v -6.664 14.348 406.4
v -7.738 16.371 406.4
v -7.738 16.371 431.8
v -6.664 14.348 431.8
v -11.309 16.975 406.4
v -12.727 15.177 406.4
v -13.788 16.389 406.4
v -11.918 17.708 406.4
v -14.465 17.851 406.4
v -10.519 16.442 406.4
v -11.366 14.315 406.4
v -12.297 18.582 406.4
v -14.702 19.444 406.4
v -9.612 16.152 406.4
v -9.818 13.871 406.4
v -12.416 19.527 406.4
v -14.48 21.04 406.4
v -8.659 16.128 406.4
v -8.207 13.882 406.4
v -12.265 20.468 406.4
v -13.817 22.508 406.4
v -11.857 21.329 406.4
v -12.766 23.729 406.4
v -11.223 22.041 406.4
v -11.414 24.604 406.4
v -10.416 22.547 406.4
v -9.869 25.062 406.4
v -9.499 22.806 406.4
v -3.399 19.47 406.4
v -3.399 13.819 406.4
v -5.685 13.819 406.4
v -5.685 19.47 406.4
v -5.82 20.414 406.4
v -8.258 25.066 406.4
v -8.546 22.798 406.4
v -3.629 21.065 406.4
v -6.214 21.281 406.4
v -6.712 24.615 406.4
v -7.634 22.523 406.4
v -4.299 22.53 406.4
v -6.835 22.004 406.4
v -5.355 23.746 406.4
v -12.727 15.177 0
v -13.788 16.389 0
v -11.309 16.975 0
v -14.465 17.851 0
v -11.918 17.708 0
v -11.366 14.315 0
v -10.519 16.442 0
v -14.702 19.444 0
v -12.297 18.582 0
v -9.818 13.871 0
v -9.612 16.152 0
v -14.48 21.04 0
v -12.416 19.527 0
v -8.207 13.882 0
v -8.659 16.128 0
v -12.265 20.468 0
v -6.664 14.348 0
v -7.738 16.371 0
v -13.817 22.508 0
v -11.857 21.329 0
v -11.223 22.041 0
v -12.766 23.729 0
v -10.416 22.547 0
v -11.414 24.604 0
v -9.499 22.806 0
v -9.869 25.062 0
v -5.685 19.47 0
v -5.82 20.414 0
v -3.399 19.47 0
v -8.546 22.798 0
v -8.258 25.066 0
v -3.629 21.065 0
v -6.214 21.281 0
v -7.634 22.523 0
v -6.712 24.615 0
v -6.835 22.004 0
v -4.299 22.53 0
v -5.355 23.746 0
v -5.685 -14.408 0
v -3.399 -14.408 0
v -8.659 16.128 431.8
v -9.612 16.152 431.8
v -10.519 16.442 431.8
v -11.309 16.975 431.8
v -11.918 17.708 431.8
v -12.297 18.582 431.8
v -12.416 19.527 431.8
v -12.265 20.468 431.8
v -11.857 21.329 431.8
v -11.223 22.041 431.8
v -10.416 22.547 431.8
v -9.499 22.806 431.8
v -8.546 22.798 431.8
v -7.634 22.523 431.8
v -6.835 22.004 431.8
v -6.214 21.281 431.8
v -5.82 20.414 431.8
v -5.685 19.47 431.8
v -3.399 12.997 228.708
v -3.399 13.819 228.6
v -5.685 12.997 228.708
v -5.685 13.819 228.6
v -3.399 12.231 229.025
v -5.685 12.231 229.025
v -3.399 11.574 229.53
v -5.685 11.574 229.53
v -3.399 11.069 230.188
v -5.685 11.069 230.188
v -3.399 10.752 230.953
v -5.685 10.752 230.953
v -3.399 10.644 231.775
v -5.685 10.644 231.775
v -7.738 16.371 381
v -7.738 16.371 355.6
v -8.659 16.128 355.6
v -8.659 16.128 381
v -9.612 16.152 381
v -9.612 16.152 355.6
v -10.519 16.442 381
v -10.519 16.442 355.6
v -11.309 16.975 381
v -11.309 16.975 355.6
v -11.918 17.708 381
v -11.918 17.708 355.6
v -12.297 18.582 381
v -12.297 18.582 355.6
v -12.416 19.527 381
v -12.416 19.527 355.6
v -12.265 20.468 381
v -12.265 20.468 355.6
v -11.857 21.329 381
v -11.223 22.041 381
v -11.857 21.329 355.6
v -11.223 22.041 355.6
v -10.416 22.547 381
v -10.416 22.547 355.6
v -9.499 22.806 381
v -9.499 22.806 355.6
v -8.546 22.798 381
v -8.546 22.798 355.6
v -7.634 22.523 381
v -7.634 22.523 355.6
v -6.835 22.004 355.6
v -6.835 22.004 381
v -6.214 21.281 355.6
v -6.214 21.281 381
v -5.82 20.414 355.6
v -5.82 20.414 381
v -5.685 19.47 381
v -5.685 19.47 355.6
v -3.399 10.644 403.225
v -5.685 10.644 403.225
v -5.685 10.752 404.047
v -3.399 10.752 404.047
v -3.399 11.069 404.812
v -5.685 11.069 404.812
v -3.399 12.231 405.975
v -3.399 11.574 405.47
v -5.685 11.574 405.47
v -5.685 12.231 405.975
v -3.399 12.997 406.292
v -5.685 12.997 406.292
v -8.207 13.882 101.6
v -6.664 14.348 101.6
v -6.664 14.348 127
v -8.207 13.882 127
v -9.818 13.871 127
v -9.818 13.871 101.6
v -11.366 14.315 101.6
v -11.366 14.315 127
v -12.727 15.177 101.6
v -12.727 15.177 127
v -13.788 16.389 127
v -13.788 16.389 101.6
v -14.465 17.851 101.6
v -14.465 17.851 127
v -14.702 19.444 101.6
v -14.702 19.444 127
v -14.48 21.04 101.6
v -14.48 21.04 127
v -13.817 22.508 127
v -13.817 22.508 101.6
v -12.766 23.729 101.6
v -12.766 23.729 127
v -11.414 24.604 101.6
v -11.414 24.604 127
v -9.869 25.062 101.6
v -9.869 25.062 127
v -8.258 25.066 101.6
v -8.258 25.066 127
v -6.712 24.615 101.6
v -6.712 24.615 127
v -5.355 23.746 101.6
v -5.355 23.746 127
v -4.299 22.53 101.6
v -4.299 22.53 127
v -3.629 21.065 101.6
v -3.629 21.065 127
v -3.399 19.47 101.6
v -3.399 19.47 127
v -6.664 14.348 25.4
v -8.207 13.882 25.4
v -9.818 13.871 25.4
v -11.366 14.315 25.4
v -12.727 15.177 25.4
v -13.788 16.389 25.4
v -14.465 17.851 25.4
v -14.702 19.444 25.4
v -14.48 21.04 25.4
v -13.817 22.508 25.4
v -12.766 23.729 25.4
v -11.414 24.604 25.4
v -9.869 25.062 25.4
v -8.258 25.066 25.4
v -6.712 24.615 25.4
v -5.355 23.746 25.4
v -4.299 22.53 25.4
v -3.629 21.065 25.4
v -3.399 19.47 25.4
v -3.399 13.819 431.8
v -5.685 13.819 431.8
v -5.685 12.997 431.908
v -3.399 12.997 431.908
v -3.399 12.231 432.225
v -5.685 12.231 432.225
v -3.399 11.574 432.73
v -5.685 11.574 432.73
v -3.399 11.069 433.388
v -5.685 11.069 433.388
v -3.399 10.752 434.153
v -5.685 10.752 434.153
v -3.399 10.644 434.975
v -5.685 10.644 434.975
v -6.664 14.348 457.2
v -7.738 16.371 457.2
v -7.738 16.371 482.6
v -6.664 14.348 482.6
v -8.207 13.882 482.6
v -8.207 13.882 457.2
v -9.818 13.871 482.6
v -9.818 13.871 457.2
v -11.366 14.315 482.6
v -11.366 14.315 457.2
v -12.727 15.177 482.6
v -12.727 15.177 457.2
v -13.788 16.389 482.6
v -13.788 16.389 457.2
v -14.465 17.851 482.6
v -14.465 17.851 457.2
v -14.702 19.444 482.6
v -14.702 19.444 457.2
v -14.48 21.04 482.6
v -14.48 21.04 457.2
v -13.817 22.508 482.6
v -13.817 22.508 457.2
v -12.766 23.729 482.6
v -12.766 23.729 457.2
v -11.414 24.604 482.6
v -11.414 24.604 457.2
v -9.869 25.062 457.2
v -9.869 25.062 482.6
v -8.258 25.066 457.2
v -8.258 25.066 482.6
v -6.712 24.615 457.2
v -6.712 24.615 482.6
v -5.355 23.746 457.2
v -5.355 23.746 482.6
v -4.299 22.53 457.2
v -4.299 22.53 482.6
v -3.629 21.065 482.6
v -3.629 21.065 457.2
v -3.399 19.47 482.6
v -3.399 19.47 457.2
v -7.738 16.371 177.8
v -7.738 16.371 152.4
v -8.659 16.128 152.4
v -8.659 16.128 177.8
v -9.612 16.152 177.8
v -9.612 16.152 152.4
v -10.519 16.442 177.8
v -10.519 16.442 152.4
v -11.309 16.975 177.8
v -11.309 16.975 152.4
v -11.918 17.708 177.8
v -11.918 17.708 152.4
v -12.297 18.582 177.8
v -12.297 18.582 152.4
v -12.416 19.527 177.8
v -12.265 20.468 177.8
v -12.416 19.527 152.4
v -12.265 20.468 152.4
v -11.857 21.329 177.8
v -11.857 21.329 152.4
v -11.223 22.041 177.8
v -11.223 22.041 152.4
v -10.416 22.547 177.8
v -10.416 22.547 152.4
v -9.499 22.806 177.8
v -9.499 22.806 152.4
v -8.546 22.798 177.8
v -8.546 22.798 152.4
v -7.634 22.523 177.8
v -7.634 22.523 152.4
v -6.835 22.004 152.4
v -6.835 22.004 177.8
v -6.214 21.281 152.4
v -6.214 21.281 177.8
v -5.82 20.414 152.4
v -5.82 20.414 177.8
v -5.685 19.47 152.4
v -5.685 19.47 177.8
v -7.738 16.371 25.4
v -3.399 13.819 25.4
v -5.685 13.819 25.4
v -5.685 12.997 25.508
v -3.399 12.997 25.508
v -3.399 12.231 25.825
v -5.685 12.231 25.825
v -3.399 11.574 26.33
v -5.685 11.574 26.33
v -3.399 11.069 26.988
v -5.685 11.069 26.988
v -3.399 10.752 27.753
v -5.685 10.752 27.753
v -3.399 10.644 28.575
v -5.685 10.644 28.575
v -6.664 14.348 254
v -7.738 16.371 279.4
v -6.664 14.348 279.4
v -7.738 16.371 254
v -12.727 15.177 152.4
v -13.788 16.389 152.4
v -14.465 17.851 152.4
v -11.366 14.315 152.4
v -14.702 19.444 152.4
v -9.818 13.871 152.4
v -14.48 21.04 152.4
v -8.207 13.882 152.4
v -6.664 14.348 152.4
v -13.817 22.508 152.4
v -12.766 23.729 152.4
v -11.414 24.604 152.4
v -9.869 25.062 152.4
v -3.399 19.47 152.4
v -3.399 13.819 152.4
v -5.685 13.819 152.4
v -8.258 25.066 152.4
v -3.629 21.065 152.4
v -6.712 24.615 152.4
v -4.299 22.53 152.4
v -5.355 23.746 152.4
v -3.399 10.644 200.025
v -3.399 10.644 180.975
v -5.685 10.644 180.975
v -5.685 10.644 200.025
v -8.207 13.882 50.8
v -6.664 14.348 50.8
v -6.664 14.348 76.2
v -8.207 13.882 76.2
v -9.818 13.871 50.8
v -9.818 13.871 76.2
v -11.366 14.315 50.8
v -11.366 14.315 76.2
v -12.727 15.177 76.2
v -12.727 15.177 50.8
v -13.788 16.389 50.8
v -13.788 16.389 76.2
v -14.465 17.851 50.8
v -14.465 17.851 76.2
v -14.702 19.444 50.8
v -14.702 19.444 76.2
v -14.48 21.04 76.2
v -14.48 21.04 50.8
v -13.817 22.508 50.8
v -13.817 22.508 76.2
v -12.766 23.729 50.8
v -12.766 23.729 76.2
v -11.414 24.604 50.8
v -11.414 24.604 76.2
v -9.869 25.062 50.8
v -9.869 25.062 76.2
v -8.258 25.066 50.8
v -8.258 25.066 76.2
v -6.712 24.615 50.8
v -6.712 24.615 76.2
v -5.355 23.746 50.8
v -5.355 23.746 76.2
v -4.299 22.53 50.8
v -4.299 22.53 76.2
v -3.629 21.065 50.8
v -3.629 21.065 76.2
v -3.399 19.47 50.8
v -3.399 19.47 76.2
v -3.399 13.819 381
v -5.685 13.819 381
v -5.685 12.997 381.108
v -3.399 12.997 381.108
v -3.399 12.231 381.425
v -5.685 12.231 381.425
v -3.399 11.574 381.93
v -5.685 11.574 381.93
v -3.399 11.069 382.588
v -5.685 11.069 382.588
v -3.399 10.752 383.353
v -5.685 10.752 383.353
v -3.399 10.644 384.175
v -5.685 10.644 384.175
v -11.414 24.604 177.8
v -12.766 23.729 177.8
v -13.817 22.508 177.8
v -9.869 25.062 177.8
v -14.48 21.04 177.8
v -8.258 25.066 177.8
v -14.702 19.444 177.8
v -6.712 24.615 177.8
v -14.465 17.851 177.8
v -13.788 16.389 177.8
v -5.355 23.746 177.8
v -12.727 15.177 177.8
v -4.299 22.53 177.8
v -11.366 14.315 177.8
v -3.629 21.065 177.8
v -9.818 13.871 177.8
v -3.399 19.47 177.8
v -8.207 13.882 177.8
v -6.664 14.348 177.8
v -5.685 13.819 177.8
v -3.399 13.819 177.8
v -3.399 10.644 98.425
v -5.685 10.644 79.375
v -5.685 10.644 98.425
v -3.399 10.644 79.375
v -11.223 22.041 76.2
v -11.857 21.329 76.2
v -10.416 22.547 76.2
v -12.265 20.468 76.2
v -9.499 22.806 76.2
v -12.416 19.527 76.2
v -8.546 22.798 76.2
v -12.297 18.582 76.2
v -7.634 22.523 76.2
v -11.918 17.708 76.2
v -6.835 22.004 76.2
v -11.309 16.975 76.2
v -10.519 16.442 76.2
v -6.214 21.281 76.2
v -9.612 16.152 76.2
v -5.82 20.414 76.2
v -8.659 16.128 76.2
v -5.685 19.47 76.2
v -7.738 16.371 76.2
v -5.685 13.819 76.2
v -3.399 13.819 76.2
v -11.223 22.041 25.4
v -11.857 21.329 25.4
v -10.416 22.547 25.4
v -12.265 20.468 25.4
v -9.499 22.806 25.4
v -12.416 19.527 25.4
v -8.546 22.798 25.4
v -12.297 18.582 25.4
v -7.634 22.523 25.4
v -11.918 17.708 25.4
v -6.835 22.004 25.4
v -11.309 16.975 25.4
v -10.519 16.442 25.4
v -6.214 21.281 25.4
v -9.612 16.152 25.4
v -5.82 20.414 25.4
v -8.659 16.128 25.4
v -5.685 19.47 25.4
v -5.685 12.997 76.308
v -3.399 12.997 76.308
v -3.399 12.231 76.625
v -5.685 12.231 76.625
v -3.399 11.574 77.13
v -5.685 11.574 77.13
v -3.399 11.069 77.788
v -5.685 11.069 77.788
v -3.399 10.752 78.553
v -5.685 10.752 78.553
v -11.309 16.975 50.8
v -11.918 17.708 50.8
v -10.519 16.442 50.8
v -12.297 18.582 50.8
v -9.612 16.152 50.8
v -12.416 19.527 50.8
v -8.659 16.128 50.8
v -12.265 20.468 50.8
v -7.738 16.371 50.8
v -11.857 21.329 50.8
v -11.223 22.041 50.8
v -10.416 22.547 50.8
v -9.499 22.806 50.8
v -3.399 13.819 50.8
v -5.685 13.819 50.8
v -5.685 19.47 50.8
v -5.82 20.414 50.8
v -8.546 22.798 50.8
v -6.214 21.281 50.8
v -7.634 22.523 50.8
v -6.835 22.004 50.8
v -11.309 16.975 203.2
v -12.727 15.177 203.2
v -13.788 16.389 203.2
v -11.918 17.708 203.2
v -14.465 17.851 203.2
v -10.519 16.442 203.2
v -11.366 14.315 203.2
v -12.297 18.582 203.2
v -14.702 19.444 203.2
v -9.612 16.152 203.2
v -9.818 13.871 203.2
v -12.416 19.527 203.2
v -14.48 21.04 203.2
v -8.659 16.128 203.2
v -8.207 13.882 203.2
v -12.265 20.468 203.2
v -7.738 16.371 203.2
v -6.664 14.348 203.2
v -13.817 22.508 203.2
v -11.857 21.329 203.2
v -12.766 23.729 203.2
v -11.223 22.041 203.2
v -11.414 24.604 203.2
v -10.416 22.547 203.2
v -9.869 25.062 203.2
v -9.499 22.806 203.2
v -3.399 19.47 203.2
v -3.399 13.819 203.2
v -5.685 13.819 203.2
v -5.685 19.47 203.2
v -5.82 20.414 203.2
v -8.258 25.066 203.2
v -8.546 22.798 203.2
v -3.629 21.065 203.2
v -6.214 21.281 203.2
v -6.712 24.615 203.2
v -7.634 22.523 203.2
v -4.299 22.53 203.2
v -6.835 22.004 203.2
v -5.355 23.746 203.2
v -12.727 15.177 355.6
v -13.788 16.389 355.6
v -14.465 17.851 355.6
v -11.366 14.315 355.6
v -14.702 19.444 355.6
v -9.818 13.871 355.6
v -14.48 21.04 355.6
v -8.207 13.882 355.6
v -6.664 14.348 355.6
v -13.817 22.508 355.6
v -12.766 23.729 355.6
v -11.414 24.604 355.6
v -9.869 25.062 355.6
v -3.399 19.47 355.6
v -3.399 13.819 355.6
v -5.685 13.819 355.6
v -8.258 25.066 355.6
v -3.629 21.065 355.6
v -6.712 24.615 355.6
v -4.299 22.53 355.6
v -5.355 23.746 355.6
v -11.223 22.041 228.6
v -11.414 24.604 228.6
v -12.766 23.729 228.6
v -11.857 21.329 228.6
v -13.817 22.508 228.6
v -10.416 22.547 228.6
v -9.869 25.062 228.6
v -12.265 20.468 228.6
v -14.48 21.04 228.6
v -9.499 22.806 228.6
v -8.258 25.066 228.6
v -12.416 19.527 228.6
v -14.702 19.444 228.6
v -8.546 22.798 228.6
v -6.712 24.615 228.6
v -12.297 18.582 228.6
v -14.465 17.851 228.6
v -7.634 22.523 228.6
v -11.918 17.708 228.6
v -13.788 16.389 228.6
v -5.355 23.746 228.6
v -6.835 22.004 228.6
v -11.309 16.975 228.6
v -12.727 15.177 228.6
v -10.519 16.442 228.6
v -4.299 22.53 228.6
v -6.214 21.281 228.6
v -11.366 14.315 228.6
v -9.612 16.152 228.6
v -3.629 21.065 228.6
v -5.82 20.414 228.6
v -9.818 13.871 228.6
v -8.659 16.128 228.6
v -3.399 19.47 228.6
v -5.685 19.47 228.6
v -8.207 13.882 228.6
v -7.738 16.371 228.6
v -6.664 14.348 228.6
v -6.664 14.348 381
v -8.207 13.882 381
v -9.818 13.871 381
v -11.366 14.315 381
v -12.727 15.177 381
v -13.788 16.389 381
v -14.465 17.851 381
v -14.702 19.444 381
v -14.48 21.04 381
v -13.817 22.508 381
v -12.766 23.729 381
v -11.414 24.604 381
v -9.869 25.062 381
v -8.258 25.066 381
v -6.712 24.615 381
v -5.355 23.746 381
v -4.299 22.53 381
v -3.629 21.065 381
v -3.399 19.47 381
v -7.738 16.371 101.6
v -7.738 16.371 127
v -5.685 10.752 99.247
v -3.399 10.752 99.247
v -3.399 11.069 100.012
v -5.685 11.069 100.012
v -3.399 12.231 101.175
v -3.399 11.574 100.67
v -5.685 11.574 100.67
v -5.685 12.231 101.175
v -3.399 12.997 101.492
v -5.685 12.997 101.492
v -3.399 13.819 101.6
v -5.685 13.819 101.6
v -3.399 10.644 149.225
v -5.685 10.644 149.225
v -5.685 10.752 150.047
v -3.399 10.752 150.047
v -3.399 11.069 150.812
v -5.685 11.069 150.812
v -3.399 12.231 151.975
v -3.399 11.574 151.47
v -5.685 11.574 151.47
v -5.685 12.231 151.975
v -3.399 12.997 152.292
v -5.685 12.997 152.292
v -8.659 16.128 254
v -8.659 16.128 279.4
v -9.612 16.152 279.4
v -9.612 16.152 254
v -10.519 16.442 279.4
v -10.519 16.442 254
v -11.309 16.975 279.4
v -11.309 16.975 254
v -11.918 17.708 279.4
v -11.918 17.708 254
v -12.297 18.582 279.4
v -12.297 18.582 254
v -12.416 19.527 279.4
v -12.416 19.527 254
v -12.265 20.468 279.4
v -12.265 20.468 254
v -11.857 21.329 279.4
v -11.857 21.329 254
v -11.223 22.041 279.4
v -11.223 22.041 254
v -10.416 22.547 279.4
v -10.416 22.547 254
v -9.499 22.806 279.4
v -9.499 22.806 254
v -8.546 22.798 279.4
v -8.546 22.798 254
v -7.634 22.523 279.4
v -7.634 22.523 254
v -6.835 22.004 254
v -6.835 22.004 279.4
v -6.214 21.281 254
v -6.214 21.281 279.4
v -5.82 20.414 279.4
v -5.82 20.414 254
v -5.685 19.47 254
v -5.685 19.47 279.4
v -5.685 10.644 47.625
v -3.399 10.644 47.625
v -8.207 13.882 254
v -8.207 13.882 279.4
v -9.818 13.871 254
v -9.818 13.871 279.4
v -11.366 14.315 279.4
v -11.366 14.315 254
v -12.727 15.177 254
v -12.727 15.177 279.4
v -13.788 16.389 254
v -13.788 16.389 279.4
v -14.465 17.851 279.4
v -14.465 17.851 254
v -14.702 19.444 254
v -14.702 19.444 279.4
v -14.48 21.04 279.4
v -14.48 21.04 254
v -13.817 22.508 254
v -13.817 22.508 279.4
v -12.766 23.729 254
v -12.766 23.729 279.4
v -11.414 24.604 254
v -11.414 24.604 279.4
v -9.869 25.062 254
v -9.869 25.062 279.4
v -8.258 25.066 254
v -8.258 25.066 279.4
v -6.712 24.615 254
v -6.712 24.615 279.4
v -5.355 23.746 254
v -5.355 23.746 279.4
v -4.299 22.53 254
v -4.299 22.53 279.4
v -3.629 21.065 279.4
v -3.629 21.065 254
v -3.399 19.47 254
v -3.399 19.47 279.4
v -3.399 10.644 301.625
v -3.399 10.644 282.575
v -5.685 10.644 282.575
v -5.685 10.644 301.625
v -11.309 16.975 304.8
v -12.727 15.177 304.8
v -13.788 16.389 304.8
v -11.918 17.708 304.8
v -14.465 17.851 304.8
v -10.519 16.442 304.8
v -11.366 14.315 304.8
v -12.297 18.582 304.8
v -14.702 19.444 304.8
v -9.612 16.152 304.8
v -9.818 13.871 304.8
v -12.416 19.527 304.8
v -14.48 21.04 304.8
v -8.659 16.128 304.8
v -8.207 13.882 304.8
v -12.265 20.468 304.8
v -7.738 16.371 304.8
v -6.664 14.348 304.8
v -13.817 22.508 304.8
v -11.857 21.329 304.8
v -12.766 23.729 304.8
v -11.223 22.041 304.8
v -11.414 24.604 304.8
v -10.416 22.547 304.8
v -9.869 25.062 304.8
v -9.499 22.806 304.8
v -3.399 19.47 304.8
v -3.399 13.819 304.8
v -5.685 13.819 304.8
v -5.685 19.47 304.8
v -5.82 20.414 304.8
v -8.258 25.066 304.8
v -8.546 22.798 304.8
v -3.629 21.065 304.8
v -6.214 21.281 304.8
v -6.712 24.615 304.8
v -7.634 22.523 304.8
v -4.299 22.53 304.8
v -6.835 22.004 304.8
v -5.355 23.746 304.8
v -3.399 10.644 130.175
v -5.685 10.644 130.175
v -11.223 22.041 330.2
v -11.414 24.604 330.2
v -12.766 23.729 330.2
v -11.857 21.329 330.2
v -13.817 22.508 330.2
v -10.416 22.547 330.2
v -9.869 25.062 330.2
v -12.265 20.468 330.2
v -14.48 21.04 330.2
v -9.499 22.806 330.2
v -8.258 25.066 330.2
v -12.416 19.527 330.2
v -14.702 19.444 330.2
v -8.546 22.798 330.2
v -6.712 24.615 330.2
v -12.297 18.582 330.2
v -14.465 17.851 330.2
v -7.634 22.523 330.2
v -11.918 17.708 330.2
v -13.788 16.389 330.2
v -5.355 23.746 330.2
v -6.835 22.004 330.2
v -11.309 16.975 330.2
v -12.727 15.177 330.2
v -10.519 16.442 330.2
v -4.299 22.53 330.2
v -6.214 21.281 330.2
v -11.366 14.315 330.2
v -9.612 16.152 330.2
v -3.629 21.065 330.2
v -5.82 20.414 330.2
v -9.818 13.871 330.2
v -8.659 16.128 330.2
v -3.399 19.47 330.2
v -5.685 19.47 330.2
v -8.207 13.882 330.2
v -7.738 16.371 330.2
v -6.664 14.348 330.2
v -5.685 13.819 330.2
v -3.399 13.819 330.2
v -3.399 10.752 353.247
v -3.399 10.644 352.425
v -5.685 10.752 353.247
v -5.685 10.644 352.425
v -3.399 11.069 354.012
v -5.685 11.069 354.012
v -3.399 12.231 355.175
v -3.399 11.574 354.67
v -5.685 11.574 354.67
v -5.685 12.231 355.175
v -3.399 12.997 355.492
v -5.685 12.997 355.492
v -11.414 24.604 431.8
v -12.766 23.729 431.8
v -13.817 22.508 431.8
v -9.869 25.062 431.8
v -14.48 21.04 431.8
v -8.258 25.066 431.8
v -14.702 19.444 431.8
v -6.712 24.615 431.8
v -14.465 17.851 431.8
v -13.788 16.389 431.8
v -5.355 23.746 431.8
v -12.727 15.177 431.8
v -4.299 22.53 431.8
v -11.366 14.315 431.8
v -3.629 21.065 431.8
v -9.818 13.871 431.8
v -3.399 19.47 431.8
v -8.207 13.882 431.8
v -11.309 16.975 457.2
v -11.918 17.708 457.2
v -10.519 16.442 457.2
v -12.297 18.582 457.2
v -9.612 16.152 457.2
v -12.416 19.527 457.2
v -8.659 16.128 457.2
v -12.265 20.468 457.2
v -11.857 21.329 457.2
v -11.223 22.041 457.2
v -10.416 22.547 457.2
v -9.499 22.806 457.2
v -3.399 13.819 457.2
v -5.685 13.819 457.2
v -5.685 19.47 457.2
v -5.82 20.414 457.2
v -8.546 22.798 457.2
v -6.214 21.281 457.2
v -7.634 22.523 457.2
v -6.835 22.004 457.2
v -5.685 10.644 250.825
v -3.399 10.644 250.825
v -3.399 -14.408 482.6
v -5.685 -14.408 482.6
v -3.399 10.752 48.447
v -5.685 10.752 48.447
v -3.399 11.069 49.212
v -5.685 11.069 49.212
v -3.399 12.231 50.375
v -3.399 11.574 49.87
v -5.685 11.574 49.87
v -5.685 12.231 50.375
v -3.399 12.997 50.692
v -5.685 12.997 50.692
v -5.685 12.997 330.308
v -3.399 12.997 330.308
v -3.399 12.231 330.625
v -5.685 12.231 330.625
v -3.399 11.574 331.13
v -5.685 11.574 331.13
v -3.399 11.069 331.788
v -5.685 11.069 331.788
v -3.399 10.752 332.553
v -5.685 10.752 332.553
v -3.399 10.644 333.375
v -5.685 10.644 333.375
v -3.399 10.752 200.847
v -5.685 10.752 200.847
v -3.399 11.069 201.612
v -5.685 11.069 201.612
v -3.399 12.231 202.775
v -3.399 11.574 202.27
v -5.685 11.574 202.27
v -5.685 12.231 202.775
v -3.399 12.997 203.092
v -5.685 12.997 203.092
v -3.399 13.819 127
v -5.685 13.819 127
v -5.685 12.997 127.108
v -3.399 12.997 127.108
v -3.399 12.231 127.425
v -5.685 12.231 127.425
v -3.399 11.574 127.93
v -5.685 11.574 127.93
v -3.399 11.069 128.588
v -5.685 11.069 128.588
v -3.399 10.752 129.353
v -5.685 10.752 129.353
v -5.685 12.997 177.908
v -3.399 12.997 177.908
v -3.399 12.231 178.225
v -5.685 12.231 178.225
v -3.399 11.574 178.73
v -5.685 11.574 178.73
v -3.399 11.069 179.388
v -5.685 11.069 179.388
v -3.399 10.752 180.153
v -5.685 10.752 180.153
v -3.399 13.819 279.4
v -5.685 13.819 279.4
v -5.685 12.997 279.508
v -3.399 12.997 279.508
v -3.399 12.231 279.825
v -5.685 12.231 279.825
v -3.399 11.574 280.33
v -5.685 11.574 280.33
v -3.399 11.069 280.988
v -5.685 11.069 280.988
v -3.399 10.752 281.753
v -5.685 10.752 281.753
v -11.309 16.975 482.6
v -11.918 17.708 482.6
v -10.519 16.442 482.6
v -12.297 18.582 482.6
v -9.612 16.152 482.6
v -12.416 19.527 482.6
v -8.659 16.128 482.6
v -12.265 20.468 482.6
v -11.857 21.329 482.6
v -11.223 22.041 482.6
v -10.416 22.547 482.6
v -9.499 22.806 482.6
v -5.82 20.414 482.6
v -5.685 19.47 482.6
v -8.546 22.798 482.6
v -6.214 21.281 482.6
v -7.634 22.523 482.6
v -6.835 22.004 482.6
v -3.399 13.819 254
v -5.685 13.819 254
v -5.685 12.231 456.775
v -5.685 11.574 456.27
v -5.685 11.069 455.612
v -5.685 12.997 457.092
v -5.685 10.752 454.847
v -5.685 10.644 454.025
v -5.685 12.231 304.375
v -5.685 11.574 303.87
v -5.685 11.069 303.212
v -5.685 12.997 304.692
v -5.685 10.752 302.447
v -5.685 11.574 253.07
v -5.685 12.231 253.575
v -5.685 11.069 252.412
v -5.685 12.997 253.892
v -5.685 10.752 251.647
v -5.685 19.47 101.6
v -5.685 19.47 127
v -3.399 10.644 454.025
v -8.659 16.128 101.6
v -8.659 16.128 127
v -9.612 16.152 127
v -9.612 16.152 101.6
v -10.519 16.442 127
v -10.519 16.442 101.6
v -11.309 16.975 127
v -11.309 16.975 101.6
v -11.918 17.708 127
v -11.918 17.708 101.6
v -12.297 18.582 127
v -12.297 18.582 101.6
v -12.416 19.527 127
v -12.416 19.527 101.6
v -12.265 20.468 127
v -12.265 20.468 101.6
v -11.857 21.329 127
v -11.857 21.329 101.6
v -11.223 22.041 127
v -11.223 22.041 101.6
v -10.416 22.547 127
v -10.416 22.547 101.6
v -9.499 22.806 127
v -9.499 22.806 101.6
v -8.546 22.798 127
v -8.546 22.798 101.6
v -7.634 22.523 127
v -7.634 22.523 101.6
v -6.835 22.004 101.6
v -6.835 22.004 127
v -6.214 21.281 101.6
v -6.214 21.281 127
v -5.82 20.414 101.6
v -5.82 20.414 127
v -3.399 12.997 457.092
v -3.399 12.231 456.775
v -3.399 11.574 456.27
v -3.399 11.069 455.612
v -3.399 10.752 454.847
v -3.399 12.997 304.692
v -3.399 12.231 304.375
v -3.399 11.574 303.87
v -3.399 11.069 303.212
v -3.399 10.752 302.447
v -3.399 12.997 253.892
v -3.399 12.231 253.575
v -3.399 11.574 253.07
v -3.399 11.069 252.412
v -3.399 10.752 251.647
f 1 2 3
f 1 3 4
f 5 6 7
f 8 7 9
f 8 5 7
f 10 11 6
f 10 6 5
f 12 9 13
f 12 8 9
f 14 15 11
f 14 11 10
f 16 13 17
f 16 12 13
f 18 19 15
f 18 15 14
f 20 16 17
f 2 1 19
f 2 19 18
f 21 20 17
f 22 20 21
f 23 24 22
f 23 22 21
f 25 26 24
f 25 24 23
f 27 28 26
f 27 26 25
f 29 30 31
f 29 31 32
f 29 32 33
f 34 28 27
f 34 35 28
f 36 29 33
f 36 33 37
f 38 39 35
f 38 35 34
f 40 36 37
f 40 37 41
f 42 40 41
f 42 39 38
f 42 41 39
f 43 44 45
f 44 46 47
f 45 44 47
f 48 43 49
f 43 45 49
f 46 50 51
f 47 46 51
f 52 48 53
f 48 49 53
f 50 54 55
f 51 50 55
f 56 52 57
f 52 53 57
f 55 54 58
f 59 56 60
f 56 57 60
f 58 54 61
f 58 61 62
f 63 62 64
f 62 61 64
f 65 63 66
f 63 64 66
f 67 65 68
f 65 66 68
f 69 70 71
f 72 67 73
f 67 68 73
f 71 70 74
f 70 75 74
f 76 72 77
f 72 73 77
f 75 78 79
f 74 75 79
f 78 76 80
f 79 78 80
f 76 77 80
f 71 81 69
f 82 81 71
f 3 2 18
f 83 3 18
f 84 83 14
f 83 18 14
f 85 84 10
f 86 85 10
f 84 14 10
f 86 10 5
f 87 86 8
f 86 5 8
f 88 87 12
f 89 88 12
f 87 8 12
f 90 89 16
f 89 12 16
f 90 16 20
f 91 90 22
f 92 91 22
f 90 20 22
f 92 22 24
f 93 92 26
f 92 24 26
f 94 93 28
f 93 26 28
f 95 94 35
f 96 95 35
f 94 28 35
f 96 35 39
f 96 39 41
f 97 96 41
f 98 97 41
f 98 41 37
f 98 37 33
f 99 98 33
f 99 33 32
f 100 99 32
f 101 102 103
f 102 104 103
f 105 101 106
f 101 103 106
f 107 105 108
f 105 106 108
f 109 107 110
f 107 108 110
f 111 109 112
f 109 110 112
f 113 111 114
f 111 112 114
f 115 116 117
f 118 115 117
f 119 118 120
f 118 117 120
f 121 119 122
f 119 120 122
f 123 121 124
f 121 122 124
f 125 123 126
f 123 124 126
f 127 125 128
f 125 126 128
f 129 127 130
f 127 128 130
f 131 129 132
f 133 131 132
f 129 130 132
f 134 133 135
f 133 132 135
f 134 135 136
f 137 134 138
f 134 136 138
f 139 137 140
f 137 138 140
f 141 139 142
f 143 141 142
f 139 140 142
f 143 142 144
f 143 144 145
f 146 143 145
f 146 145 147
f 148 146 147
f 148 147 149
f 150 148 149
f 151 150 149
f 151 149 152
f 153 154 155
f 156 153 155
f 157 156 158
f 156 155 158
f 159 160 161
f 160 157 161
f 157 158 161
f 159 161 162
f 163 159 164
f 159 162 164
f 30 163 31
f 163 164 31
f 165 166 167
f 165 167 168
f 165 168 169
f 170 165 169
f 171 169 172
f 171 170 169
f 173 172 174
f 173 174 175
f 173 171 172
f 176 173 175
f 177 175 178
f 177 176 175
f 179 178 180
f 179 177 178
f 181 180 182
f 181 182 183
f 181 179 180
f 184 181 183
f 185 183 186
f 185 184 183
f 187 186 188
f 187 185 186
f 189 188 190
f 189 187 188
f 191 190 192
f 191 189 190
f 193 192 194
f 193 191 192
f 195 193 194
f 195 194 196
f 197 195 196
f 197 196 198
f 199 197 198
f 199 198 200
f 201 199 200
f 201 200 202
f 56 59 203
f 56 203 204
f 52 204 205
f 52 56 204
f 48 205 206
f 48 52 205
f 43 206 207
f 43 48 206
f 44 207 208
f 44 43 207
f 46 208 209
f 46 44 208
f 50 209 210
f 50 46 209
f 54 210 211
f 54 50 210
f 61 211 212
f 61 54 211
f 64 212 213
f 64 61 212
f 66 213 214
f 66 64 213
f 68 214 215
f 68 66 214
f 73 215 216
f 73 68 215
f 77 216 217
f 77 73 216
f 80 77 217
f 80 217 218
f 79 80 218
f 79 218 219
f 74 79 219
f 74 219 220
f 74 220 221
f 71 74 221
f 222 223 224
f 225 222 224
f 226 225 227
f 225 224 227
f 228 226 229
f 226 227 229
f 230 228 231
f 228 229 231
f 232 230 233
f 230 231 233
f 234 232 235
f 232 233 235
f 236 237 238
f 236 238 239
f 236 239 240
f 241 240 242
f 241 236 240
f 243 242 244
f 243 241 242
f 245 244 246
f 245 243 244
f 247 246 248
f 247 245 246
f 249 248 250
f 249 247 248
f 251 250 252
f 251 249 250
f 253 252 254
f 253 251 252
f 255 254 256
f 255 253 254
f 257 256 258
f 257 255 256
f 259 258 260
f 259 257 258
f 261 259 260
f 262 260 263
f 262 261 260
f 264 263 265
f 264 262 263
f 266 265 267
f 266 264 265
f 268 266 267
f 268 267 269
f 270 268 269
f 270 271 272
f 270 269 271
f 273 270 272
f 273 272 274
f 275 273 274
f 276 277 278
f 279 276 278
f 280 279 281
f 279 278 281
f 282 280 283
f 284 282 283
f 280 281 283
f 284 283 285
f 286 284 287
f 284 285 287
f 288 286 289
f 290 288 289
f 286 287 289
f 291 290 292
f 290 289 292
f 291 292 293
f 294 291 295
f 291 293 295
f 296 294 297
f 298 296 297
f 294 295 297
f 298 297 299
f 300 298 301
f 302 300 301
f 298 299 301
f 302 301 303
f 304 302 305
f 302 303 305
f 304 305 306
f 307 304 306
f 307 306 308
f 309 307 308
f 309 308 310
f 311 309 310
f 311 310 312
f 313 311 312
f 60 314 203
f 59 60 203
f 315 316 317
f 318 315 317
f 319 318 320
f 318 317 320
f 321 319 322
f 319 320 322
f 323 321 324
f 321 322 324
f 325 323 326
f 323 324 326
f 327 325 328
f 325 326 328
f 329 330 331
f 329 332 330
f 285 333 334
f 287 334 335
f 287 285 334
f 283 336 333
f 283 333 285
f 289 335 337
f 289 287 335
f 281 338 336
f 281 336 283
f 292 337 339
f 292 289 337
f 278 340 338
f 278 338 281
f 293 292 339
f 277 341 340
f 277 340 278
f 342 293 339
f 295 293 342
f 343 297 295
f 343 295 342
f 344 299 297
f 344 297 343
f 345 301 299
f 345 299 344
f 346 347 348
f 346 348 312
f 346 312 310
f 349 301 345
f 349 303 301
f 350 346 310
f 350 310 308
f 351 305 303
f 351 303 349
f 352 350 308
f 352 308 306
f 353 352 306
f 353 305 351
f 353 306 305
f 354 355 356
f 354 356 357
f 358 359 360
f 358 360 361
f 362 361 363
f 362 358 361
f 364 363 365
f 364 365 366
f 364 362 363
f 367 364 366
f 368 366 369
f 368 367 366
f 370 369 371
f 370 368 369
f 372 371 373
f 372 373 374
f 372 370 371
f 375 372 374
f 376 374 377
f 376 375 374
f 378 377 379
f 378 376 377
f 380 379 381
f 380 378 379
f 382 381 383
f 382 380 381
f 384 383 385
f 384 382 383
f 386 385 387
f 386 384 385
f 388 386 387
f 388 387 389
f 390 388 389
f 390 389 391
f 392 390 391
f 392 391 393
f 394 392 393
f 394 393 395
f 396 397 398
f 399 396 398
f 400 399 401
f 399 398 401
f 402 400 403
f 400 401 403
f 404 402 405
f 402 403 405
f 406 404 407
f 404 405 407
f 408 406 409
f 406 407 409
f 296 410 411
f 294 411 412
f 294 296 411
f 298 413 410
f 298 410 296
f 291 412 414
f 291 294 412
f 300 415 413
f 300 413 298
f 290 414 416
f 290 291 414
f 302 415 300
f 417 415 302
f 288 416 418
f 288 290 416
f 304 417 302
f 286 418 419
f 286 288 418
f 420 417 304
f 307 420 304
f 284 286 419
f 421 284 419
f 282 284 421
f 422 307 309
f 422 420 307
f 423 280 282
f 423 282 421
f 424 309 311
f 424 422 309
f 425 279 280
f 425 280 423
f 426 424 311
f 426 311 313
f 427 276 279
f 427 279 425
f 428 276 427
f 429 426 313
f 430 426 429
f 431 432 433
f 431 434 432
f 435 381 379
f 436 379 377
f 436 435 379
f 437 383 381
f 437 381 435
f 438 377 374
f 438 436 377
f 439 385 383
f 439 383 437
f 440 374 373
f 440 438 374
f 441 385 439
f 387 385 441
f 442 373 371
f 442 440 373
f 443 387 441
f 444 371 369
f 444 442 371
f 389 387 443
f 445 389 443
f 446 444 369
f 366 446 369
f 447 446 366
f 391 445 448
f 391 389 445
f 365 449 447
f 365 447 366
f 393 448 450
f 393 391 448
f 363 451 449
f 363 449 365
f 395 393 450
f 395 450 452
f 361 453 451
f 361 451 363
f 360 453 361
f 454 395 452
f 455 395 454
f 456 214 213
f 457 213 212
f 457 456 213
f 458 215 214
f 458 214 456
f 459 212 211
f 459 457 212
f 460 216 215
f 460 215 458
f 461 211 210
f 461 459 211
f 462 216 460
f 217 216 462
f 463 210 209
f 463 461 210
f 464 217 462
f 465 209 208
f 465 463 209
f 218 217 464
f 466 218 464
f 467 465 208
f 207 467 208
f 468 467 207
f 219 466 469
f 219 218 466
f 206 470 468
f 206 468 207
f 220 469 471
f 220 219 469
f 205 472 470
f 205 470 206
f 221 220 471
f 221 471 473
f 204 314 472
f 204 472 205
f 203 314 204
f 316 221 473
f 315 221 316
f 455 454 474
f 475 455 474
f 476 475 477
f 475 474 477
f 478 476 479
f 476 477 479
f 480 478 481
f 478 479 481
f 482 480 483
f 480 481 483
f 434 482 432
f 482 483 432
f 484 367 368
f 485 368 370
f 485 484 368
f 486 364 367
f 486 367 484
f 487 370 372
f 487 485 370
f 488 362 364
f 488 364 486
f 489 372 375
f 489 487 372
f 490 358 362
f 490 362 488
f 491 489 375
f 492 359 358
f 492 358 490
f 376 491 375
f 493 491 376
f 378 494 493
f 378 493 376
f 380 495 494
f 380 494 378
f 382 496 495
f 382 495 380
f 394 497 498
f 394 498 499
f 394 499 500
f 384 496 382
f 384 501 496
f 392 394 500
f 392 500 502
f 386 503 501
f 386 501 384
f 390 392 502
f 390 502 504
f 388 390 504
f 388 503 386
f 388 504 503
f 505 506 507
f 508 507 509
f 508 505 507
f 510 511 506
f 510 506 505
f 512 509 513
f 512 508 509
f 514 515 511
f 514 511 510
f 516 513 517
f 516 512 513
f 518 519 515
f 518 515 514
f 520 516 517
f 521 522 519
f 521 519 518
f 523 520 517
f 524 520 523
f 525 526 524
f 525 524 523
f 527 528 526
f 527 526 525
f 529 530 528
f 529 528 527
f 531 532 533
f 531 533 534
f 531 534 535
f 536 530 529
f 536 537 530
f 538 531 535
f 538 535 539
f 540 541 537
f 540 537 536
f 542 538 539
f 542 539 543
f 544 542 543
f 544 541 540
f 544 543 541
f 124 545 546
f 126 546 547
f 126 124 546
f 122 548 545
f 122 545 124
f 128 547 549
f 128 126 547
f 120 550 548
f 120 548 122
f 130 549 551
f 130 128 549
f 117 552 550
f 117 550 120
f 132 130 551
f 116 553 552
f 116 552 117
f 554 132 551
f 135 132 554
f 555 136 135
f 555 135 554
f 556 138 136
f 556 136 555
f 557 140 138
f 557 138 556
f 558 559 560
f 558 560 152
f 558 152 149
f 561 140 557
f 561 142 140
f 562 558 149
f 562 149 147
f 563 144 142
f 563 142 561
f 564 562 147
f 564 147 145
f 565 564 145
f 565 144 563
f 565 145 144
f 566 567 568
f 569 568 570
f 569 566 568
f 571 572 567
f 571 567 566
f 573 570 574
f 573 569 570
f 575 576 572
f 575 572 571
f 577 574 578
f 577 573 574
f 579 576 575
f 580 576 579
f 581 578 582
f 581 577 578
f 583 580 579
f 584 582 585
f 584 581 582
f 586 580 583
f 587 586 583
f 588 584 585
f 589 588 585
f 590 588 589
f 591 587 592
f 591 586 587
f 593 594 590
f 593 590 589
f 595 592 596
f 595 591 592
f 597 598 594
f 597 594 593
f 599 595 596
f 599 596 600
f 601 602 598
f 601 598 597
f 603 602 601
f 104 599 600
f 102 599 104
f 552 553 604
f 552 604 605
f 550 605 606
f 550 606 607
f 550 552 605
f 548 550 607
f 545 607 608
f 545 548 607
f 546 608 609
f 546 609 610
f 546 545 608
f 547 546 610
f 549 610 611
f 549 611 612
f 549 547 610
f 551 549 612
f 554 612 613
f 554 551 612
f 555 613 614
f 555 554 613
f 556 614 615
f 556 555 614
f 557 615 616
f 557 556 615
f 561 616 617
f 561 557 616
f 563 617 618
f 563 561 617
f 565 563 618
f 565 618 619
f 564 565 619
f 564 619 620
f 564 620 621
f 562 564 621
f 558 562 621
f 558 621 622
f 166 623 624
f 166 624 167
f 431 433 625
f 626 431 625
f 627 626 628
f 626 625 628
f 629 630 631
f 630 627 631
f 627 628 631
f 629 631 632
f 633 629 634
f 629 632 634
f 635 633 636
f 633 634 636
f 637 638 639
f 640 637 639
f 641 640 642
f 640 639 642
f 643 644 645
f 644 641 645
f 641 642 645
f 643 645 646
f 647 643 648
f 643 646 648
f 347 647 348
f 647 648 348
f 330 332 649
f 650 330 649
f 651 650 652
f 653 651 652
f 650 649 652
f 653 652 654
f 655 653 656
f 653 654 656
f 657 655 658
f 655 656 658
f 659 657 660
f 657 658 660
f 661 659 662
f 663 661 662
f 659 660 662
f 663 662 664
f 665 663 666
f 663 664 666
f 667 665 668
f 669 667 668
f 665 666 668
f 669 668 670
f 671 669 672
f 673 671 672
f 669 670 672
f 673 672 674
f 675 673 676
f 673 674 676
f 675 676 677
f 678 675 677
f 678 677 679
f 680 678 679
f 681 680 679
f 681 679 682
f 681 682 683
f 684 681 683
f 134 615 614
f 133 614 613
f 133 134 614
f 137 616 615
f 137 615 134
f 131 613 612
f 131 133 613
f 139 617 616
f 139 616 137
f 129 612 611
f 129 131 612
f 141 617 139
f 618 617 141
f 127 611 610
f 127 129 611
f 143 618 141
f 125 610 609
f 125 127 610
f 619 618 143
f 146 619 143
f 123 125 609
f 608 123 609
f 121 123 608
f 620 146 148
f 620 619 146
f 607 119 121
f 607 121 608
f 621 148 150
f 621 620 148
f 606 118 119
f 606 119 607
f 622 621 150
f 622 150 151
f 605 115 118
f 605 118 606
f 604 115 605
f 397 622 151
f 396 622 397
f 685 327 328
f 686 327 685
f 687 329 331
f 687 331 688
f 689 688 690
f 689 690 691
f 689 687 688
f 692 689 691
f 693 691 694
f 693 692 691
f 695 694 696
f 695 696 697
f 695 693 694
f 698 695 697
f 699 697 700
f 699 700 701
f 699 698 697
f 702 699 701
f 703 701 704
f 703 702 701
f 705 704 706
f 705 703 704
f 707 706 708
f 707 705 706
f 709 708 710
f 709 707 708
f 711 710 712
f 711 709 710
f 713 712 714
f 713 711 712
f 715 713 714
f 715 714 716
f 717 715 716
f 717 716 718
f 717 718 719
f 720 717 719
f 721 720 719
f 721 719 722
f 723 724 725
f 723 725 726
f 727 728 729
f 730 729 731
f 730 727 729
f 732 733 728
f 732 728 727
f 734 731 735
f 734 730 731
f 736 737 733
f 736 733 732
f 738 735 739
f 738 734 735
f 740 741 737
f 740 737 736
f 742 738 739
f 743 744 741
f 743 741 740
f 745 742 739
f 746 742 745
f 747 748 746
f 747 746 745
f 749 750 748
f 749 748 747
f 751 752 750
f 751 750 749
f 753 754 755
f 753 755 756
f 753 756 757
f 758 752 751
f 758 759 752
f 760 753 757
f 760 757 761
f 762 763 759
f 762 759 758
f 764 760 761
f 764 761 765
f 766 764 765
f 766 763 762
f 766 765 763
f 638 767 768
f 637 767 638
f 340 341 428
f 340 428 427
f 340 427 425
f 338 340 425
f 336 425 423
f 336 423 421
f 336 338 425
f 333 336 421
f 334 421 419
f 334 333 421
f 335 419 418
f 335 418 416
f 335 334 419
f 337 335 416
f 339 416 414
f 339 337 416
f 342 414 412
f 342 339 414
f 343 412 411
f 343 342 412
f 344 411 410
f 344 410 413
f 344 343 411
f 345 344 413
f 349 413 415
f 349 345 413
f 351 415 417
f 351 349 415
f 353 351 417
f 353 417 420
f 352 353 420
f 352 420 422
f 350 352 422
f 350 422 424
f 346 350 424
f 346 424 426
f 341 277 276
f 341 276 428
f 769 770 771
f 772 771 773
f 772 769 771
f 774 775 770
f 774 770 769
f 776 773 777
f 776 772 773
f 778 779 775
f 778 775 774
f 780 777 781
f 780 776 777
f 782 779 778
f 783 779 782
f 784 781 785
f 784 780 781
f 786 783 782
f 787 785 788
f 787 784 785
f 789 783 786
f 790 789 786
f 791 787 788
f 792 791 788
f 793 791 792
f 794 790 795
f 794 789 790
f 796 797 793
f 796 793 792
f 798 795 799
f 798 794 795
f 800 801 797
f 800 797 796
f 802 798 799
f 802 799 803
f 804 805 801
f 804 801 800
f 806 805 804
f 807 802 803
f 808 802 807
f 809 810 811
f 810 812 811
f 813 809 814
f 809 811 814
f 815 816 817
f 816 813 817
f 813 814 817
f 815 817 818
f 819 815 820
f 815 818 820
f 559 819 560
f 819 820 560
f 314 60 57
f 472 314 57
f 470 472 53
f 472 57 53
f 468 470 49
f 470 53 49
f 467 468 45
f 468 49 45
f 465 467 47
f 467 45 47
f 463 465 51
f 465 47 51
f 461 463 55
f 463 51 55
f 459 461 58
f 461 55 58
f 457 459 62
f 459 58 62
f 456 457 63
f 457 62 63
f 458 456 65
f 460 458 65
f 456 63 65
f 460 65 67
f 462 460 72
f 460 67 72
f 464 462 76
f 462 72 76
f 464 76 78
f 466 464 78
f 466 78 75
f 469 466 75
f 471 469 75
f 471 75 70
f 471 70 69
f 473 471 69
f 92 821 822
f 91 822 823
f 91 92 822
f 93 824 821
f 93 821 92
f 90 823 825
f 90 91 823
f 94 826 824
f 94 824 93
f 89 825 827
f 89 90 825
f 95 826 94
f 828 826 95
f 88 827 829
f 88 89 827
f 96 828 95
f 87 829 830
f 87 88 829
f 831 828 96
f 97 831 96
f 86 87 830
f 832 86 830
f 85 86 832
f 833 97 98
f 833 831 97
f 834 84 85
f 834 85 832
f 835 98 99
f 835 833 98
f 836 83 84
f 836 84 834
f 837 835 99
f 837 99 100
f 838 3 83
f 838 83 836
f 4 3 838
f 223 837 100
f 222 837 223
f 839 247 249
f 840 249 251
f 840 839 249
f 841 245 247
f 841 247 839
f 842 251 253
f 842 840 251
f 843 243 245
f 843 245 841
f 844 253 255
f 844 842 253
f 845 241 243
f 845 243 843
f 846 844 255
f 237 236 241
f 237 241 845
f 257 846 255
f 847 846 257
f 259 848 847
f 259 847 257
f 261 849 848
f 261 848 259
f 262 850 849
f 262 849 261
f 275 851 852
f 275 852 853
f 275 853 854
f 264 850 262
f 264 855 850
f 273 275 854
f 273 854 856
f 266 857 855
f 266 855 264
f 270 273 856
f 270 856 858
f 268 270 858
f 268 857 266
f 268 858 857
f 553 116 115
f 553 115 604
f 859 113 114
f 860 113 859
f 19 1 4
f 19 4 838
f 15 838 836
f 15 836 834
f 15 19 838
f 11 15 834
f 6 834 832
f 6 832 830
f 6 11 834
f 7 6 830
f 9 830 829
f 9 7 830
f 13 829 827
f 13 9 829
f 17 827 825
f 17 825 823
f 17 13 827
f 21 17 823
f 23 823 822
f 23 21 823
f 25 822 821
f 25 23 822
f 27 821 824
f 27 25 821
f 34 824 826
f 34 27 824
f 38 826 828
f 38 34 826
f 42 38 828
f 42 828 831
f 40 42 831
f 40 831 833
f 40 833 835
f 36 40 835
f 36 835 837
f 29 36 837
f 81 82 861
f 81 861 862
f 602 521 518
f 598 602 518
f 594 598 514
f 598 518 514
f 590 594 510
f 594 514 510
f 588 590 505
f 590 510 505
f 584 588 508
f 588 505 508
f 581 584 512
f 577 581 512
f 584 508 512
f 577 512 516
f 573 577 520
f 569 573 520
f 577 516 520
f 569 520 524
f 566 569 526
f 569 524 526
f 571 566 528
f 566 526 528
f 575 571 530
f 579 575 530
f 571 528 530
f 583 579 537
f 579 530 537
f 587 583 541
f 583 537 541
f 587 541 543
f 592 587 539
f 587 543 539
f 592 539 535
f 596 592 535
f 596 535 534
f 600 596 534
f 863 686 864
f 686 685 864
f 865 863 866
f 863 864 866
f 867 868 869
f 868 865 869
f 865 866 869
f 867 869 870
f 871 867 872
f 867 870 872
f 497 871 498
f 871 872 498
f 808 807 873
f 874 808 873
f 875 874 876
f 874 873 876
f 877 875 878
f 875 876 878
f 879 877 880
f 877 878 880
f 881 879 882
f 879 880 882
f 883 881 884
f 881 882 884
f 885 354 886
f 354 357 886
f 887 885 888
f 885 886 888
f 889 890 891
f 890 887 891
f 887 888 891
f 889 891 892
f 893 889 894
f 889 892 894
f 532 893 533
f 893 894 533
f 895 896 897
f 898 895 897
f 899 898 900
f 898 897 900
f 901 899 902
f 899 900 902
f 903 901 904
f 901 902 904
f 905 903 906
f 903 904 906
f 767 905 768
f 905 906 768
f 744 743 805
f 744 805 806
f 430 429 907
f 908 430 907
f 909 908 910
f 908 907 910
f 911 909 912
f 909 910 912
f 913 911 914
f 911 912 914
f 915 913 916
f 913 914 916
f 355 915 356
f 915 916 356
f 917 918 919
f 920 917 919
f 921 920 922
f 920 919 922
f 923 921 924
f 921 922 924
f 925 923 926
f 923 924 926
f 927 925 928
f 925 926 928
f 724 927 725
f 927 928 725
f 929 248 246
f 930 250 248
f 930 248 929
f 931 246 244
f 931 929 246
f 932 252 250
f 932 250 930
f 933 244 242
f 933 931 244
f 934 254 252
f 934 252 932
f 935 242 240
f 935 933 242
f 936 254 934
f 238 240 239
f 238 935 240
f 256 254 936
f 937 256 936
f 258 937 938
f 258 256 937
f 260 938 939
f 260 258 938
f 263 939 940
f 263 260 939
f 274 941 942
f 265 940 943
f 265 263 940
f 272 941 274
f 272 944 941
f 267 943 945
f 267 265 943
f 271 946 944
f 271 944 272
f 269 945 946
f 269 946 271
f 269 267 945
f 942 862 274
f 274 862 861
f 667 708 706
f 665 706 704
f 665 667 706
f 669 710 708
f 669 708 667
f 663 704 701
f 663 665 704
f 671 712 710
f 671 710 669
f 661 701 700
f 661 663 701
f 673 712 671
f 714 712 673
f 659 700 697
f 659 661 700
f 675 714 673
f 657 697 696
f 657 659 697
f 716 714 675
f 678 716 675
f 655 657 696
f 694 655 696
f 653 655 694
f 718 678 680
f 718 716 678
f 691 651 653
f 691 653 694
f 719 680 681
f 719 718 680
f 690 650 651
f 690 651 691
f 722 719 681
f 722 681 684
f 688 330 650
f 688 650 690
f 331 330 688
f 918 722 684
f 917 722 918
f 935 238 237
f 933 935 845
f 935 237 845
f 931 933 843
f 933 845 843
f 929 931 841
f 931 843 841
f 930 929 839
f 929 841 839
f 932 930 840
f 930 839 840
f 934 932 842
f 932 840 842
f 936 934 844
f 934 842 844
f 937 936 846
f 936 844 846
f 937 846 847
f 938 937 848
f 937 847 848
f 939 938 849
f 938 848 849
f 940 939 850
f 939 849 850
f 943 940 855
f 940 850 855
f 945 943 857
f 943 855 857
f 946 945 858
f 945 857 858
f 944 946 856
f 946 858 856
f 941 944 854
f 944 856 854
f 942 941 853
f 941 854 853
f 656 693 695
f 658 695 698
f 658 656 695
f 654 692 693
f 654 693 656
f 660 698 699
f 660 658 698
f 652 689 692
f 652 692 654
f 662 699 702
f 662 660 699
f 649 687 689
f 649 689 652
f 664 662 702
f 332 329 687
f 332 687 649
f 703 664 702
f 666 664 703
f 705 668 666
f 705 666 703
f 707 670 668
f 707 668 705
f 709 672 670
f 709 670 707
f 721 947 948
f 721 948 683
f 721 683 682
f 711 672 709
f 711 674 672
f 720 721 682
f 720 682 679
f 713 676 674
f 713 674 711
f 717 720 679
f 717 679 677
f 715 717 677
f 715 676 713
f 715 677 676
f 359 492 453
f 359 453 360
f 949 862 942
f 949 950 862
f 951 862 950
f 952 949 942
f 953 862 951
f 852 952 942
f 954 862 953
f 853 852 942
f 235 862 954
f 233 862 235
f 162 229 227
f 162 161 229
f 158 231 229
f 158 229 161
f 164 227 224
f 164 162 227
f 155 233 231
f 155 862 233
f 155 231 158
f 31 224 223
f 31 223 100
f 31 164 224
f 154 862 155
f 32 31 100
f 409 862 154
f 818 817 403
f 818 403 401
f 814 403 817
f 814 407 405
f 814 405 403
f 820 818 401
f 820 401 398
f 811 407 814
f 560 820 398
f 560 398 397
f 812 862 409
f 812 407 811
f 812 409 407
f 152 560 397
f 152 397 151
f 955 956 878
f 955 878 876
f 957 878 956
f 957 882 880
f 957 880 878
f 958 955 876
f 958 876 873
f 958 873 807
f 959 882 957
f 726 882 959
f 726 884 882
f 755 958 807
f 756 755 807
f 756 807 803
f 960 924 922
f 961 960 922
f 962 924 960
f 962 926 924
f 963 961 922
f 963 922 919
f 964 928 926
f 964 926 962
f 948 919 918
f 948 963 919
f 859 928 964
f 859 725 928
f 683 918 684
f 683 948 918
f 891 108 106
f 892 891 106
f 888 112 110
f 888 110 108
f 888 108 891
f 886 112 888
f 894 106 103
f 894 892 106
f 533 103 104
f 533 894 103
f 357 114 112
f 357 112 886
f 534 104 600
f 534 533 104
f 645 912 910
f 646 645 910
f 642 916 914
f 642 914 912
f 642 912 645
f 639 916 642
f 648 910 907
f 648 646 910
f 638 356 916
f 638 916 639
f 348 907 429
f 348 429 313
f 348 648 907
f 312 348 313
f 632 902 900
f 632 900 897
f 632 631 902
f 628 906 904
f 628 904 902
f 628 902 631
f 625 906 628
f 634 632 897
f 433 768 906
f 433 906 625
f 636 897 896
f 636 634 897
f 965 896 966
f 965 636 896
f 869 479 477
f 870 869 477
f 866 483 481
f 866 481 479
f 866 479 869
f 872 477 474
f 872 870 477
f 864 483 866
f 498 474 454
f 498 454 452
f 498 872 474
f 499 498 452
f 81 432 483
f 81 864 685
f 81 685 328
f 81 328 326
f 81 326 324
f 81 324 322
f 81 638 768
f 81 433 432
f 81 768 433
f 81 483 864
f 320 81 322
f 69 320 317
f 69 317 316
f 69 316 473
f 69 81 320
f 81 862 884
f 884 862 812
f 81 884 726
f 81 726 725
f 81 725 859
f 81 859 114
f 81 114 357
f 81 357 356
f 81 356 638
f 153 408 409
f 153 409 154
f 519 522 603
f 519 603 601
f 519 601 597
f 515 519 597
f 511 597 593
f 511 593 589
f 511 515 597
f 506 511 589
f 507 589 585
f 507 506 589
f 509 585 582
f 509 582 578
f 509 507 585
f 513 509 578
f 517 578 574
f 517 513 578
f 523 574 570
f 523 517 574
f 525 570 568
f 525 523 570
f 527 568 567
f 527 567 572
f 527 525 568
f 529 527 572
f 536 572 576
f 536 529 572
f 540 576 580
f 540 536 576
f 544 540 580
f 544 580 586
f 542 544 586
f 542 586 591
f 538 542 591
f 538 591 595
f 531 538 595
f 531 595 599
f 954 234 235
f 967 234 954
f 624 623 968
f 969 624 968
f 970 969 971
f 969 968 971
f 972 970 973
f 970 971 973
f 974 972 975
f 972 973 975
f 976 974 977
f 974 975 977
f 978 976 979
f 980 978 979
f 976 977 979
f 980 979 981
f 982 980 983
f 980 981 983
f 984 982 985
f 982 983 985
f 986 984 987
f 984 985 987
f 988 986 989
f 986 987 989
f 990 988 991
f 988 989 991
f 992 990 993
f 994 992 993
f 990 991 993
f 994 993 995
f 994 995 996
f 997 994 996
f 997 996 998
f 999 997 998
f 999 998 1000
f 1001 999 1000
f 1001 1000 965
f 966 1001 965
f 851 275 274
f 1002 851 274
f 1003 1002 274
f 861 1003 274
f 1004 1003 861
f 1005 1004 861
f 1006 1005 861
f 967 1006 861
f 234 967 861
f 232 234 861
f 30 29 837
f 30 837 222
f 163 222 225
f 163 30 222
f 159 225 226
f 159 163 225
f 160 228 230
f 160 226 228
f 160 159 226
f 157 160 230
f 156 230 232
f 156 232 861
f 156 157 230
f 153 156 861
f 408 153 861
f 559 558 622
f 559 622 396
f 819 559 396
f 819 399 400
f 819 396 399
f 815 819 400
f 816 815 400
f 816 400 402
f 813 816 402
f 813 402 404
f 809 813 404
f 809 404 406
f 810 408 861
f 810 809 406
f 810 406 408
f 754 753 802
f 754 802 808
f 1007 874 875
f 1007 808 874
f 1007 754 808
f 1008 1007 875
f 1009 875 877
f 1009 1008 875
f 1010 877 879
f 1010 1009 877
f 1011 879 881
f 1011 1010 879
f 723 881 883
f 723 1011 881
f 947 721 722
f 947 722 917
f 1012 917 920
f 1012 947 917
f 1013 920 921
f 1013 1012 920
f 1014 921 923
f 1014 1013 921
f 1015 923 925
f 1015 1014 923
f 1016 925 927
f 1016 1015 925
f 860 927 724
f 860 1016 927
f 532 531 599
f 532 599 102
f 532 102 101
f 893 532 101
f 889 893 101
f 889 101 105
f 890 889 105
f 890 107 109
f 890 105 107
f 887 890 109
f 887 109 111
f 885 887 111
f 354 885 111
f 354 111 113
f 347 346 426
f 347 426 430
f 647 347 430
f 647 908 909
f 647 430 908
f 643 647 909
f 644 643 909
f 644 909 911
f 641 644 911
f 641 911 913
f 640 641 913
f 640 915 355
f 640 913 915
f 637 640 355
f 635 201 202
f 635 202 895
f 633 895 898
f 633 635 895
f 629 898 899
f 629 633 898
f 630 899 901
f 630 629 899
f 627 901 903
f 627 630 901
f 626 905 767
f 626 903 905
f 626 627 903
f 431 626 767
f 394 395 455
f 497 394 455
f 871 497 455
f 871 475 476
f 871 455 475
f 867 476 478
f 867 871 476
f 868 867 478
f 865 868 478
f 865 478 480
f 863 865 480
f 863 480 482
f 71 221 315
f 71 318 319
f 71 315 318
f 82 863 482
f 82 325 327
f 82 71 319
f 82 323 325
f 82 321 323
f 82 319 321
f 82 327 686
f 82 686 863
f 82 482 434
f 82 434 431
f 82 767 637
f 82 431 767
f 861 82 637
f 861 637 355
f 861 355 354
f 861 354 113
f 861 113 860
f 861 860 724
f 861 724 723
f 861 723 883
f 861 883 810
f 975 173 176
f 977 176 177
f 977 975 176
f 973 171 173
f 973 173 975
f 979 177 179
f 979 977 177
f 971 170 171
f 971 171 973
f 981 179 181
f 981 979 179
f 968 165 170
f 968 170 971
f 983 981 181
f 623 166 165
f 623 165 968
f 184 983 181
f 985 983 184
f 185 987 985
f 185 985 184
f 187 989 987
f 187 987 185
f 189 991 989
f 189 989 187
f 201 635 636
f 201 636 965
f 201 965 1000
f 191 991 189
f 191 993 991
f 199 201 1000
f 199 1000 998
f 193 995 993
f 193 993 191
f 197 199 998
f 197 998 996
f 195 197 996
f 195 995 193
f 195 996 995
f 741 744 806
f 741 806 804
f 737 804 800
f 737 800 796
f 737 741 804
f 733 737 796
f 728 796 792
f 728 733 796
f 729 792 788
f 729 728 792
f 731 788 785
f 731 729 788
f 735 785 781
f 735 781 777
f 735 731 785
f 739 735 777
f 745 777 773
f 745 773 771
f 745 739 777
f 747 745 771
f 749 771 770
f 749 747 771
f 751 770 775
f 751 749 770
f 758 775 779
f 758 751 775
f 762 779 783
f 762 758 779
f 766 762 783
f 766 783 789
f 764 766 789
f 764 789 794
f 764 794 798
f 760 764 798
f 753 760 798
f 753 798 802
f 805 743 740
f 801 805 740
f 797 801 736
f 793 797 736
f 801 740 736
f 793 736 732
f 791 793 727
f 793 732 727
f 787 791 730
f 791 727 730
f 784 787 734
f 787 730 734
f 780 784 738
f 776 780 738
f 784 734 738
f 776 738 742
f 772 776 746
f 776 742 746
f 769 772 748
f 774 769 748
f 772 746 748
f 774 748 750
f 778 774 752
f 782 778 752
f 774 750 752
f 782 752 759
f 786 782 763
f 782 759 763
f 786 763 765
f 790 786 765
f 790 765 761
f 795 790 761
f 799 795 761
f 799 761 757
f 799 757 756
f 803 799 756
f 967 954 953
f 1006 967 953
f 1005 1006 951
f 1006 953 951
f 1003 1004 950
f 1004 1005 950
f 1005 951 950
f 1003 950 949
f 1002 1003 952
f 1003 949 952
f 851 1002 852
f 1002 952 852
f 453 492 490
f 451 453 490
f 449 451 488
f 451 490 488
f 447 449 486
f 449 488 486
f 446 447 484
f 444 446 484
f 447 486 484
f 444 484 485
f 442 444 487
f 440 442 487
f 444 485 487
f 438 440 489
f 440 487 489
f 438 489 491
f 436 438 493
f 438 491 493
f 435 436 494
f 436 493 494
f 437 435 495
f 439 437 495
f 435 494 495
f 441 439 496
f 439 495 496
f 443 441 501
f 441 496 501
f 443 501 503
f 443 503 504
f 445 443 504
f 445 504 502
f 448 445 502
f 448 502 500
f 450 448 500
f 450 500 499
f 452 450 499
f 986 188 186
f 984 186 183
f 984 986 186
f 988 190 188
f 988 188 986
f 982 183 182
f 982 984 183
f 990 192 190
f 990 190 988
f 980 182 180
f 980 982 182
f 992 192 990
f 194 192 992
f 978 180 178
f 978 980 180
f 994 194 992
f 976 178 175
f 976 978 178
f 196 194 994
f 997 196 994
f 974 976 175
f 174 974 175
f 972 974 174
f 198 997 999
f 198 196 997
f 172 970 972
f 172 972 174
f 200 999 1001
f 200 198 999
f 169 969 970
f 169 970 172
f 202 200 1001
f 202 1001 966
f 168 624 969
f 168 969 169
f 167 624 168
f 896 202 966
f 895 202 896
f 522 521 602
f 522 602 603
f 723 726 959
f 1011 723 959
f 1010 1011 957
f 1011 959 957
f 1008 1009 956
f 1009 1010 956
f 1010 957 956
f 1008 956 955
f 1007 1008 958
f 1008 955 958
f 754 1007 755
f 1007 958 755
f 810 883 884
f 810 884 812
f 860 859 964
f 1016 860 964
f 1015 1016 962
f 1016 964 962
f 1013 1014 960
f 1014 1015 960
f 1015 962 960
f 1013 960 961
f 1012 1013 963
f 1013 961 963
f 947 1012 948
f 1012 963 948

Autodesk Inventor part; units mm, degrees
ref_plane "YZ Plane" through (0, 0, 0) normal (1, 0, 0) x (0, 1, 0)
ref_plane "XZ Plane" through (0, 0, 0) normal (0, 1, 0) x (-1, 0, 0)
ref_plane "XY Plane" through (0, 0, 0) normal (0, 0, 1) x (1, 0, 0)
sketch "Sketch1" plane through (0, 0, 0) normal (0, 0, 1) x (1, 0, 0)
  line L0 (-3.3994, 19.4704) -> (-3.3994, -14.4081)
  line L1 (-3.3994, -14.4081) -> (-5.6854, -14.4081)
  arc A0 (-3.3994, 19.4704) -> (-6.6643, 14.3475) centre (-9.0509, 19.4704) ccw
  arc A1 (-5.6854, 19.4704) -> (-7.7383, 16.3714) centre (-9.0509, 19.4704) ccw
  line L2 (-7.7383, 16.3714) -> (-6.6643, 14.3475)
  line L3 (-5.6854, -14.4081) -> (-5.6854, 19.4704)
  dimension "d0" = 11.303
  dimension "d2" = 2.286
extrude "Extrusion1" add sketch "Sketch1" along normal blind 482.6
sketch "Sketch2" plane through (-3.3994, -14.4081, 0) normal (1, 0, 0) x (0, 0, -1)
  line L0 (-482.6, 33.8785) -> (-482.6, 0) projected
  line L1 (-457.2, 50.4757) -> (-431.8, 50.4757)
  line L2 (-431.8, 50.4757) -> (-431.8, 25.052)
  line L3 (-431.8, 25.052) -> (-457.2, 25.052)
  line L4 (-457.2, 25.052) -> (-457.2, 50.4757)
  line L5 (-482.6, 37.244) -> (0, 37.244) projected
  line L6 (-482.6, 33.8785) -> (-482.6, 30.7795) projected
  line L7 (0, 30.7795) -> (-482.6, 30.7795) projected
  line L8 (0, 30.7795) -> (0, 33.8785) projected
  line L9 (0, 33.8785) -> (-482.6, 33.8785) projected
  line L10 (0, 28.227) -> (-482.6, 28.227) projected
  dimension "d5" = 25.4
  dimension "d6" = 25.4
  dimension "d7" = 3.175
extrude "Extrusion2" cut sketch "Sketch2" against normal through all contours L9 L2 L7 L4 | L4 L5 L2 L9 | L7 L2 L10 L4 | L4 L1 L2 L5 | L10 L2 L3 L4
fillet "Fillet1" radius 3.175 2 edges at (-4.5424, 10.6439, 431.8) (-4.5424, 10.6439, 457.2)
pattern_linear "Rectangular Pattern1" count 9 spacing 50.8 along (0, 0, -1) of "Extrusion2", "Fillet1"
properties part number "FE-00004-03A"
